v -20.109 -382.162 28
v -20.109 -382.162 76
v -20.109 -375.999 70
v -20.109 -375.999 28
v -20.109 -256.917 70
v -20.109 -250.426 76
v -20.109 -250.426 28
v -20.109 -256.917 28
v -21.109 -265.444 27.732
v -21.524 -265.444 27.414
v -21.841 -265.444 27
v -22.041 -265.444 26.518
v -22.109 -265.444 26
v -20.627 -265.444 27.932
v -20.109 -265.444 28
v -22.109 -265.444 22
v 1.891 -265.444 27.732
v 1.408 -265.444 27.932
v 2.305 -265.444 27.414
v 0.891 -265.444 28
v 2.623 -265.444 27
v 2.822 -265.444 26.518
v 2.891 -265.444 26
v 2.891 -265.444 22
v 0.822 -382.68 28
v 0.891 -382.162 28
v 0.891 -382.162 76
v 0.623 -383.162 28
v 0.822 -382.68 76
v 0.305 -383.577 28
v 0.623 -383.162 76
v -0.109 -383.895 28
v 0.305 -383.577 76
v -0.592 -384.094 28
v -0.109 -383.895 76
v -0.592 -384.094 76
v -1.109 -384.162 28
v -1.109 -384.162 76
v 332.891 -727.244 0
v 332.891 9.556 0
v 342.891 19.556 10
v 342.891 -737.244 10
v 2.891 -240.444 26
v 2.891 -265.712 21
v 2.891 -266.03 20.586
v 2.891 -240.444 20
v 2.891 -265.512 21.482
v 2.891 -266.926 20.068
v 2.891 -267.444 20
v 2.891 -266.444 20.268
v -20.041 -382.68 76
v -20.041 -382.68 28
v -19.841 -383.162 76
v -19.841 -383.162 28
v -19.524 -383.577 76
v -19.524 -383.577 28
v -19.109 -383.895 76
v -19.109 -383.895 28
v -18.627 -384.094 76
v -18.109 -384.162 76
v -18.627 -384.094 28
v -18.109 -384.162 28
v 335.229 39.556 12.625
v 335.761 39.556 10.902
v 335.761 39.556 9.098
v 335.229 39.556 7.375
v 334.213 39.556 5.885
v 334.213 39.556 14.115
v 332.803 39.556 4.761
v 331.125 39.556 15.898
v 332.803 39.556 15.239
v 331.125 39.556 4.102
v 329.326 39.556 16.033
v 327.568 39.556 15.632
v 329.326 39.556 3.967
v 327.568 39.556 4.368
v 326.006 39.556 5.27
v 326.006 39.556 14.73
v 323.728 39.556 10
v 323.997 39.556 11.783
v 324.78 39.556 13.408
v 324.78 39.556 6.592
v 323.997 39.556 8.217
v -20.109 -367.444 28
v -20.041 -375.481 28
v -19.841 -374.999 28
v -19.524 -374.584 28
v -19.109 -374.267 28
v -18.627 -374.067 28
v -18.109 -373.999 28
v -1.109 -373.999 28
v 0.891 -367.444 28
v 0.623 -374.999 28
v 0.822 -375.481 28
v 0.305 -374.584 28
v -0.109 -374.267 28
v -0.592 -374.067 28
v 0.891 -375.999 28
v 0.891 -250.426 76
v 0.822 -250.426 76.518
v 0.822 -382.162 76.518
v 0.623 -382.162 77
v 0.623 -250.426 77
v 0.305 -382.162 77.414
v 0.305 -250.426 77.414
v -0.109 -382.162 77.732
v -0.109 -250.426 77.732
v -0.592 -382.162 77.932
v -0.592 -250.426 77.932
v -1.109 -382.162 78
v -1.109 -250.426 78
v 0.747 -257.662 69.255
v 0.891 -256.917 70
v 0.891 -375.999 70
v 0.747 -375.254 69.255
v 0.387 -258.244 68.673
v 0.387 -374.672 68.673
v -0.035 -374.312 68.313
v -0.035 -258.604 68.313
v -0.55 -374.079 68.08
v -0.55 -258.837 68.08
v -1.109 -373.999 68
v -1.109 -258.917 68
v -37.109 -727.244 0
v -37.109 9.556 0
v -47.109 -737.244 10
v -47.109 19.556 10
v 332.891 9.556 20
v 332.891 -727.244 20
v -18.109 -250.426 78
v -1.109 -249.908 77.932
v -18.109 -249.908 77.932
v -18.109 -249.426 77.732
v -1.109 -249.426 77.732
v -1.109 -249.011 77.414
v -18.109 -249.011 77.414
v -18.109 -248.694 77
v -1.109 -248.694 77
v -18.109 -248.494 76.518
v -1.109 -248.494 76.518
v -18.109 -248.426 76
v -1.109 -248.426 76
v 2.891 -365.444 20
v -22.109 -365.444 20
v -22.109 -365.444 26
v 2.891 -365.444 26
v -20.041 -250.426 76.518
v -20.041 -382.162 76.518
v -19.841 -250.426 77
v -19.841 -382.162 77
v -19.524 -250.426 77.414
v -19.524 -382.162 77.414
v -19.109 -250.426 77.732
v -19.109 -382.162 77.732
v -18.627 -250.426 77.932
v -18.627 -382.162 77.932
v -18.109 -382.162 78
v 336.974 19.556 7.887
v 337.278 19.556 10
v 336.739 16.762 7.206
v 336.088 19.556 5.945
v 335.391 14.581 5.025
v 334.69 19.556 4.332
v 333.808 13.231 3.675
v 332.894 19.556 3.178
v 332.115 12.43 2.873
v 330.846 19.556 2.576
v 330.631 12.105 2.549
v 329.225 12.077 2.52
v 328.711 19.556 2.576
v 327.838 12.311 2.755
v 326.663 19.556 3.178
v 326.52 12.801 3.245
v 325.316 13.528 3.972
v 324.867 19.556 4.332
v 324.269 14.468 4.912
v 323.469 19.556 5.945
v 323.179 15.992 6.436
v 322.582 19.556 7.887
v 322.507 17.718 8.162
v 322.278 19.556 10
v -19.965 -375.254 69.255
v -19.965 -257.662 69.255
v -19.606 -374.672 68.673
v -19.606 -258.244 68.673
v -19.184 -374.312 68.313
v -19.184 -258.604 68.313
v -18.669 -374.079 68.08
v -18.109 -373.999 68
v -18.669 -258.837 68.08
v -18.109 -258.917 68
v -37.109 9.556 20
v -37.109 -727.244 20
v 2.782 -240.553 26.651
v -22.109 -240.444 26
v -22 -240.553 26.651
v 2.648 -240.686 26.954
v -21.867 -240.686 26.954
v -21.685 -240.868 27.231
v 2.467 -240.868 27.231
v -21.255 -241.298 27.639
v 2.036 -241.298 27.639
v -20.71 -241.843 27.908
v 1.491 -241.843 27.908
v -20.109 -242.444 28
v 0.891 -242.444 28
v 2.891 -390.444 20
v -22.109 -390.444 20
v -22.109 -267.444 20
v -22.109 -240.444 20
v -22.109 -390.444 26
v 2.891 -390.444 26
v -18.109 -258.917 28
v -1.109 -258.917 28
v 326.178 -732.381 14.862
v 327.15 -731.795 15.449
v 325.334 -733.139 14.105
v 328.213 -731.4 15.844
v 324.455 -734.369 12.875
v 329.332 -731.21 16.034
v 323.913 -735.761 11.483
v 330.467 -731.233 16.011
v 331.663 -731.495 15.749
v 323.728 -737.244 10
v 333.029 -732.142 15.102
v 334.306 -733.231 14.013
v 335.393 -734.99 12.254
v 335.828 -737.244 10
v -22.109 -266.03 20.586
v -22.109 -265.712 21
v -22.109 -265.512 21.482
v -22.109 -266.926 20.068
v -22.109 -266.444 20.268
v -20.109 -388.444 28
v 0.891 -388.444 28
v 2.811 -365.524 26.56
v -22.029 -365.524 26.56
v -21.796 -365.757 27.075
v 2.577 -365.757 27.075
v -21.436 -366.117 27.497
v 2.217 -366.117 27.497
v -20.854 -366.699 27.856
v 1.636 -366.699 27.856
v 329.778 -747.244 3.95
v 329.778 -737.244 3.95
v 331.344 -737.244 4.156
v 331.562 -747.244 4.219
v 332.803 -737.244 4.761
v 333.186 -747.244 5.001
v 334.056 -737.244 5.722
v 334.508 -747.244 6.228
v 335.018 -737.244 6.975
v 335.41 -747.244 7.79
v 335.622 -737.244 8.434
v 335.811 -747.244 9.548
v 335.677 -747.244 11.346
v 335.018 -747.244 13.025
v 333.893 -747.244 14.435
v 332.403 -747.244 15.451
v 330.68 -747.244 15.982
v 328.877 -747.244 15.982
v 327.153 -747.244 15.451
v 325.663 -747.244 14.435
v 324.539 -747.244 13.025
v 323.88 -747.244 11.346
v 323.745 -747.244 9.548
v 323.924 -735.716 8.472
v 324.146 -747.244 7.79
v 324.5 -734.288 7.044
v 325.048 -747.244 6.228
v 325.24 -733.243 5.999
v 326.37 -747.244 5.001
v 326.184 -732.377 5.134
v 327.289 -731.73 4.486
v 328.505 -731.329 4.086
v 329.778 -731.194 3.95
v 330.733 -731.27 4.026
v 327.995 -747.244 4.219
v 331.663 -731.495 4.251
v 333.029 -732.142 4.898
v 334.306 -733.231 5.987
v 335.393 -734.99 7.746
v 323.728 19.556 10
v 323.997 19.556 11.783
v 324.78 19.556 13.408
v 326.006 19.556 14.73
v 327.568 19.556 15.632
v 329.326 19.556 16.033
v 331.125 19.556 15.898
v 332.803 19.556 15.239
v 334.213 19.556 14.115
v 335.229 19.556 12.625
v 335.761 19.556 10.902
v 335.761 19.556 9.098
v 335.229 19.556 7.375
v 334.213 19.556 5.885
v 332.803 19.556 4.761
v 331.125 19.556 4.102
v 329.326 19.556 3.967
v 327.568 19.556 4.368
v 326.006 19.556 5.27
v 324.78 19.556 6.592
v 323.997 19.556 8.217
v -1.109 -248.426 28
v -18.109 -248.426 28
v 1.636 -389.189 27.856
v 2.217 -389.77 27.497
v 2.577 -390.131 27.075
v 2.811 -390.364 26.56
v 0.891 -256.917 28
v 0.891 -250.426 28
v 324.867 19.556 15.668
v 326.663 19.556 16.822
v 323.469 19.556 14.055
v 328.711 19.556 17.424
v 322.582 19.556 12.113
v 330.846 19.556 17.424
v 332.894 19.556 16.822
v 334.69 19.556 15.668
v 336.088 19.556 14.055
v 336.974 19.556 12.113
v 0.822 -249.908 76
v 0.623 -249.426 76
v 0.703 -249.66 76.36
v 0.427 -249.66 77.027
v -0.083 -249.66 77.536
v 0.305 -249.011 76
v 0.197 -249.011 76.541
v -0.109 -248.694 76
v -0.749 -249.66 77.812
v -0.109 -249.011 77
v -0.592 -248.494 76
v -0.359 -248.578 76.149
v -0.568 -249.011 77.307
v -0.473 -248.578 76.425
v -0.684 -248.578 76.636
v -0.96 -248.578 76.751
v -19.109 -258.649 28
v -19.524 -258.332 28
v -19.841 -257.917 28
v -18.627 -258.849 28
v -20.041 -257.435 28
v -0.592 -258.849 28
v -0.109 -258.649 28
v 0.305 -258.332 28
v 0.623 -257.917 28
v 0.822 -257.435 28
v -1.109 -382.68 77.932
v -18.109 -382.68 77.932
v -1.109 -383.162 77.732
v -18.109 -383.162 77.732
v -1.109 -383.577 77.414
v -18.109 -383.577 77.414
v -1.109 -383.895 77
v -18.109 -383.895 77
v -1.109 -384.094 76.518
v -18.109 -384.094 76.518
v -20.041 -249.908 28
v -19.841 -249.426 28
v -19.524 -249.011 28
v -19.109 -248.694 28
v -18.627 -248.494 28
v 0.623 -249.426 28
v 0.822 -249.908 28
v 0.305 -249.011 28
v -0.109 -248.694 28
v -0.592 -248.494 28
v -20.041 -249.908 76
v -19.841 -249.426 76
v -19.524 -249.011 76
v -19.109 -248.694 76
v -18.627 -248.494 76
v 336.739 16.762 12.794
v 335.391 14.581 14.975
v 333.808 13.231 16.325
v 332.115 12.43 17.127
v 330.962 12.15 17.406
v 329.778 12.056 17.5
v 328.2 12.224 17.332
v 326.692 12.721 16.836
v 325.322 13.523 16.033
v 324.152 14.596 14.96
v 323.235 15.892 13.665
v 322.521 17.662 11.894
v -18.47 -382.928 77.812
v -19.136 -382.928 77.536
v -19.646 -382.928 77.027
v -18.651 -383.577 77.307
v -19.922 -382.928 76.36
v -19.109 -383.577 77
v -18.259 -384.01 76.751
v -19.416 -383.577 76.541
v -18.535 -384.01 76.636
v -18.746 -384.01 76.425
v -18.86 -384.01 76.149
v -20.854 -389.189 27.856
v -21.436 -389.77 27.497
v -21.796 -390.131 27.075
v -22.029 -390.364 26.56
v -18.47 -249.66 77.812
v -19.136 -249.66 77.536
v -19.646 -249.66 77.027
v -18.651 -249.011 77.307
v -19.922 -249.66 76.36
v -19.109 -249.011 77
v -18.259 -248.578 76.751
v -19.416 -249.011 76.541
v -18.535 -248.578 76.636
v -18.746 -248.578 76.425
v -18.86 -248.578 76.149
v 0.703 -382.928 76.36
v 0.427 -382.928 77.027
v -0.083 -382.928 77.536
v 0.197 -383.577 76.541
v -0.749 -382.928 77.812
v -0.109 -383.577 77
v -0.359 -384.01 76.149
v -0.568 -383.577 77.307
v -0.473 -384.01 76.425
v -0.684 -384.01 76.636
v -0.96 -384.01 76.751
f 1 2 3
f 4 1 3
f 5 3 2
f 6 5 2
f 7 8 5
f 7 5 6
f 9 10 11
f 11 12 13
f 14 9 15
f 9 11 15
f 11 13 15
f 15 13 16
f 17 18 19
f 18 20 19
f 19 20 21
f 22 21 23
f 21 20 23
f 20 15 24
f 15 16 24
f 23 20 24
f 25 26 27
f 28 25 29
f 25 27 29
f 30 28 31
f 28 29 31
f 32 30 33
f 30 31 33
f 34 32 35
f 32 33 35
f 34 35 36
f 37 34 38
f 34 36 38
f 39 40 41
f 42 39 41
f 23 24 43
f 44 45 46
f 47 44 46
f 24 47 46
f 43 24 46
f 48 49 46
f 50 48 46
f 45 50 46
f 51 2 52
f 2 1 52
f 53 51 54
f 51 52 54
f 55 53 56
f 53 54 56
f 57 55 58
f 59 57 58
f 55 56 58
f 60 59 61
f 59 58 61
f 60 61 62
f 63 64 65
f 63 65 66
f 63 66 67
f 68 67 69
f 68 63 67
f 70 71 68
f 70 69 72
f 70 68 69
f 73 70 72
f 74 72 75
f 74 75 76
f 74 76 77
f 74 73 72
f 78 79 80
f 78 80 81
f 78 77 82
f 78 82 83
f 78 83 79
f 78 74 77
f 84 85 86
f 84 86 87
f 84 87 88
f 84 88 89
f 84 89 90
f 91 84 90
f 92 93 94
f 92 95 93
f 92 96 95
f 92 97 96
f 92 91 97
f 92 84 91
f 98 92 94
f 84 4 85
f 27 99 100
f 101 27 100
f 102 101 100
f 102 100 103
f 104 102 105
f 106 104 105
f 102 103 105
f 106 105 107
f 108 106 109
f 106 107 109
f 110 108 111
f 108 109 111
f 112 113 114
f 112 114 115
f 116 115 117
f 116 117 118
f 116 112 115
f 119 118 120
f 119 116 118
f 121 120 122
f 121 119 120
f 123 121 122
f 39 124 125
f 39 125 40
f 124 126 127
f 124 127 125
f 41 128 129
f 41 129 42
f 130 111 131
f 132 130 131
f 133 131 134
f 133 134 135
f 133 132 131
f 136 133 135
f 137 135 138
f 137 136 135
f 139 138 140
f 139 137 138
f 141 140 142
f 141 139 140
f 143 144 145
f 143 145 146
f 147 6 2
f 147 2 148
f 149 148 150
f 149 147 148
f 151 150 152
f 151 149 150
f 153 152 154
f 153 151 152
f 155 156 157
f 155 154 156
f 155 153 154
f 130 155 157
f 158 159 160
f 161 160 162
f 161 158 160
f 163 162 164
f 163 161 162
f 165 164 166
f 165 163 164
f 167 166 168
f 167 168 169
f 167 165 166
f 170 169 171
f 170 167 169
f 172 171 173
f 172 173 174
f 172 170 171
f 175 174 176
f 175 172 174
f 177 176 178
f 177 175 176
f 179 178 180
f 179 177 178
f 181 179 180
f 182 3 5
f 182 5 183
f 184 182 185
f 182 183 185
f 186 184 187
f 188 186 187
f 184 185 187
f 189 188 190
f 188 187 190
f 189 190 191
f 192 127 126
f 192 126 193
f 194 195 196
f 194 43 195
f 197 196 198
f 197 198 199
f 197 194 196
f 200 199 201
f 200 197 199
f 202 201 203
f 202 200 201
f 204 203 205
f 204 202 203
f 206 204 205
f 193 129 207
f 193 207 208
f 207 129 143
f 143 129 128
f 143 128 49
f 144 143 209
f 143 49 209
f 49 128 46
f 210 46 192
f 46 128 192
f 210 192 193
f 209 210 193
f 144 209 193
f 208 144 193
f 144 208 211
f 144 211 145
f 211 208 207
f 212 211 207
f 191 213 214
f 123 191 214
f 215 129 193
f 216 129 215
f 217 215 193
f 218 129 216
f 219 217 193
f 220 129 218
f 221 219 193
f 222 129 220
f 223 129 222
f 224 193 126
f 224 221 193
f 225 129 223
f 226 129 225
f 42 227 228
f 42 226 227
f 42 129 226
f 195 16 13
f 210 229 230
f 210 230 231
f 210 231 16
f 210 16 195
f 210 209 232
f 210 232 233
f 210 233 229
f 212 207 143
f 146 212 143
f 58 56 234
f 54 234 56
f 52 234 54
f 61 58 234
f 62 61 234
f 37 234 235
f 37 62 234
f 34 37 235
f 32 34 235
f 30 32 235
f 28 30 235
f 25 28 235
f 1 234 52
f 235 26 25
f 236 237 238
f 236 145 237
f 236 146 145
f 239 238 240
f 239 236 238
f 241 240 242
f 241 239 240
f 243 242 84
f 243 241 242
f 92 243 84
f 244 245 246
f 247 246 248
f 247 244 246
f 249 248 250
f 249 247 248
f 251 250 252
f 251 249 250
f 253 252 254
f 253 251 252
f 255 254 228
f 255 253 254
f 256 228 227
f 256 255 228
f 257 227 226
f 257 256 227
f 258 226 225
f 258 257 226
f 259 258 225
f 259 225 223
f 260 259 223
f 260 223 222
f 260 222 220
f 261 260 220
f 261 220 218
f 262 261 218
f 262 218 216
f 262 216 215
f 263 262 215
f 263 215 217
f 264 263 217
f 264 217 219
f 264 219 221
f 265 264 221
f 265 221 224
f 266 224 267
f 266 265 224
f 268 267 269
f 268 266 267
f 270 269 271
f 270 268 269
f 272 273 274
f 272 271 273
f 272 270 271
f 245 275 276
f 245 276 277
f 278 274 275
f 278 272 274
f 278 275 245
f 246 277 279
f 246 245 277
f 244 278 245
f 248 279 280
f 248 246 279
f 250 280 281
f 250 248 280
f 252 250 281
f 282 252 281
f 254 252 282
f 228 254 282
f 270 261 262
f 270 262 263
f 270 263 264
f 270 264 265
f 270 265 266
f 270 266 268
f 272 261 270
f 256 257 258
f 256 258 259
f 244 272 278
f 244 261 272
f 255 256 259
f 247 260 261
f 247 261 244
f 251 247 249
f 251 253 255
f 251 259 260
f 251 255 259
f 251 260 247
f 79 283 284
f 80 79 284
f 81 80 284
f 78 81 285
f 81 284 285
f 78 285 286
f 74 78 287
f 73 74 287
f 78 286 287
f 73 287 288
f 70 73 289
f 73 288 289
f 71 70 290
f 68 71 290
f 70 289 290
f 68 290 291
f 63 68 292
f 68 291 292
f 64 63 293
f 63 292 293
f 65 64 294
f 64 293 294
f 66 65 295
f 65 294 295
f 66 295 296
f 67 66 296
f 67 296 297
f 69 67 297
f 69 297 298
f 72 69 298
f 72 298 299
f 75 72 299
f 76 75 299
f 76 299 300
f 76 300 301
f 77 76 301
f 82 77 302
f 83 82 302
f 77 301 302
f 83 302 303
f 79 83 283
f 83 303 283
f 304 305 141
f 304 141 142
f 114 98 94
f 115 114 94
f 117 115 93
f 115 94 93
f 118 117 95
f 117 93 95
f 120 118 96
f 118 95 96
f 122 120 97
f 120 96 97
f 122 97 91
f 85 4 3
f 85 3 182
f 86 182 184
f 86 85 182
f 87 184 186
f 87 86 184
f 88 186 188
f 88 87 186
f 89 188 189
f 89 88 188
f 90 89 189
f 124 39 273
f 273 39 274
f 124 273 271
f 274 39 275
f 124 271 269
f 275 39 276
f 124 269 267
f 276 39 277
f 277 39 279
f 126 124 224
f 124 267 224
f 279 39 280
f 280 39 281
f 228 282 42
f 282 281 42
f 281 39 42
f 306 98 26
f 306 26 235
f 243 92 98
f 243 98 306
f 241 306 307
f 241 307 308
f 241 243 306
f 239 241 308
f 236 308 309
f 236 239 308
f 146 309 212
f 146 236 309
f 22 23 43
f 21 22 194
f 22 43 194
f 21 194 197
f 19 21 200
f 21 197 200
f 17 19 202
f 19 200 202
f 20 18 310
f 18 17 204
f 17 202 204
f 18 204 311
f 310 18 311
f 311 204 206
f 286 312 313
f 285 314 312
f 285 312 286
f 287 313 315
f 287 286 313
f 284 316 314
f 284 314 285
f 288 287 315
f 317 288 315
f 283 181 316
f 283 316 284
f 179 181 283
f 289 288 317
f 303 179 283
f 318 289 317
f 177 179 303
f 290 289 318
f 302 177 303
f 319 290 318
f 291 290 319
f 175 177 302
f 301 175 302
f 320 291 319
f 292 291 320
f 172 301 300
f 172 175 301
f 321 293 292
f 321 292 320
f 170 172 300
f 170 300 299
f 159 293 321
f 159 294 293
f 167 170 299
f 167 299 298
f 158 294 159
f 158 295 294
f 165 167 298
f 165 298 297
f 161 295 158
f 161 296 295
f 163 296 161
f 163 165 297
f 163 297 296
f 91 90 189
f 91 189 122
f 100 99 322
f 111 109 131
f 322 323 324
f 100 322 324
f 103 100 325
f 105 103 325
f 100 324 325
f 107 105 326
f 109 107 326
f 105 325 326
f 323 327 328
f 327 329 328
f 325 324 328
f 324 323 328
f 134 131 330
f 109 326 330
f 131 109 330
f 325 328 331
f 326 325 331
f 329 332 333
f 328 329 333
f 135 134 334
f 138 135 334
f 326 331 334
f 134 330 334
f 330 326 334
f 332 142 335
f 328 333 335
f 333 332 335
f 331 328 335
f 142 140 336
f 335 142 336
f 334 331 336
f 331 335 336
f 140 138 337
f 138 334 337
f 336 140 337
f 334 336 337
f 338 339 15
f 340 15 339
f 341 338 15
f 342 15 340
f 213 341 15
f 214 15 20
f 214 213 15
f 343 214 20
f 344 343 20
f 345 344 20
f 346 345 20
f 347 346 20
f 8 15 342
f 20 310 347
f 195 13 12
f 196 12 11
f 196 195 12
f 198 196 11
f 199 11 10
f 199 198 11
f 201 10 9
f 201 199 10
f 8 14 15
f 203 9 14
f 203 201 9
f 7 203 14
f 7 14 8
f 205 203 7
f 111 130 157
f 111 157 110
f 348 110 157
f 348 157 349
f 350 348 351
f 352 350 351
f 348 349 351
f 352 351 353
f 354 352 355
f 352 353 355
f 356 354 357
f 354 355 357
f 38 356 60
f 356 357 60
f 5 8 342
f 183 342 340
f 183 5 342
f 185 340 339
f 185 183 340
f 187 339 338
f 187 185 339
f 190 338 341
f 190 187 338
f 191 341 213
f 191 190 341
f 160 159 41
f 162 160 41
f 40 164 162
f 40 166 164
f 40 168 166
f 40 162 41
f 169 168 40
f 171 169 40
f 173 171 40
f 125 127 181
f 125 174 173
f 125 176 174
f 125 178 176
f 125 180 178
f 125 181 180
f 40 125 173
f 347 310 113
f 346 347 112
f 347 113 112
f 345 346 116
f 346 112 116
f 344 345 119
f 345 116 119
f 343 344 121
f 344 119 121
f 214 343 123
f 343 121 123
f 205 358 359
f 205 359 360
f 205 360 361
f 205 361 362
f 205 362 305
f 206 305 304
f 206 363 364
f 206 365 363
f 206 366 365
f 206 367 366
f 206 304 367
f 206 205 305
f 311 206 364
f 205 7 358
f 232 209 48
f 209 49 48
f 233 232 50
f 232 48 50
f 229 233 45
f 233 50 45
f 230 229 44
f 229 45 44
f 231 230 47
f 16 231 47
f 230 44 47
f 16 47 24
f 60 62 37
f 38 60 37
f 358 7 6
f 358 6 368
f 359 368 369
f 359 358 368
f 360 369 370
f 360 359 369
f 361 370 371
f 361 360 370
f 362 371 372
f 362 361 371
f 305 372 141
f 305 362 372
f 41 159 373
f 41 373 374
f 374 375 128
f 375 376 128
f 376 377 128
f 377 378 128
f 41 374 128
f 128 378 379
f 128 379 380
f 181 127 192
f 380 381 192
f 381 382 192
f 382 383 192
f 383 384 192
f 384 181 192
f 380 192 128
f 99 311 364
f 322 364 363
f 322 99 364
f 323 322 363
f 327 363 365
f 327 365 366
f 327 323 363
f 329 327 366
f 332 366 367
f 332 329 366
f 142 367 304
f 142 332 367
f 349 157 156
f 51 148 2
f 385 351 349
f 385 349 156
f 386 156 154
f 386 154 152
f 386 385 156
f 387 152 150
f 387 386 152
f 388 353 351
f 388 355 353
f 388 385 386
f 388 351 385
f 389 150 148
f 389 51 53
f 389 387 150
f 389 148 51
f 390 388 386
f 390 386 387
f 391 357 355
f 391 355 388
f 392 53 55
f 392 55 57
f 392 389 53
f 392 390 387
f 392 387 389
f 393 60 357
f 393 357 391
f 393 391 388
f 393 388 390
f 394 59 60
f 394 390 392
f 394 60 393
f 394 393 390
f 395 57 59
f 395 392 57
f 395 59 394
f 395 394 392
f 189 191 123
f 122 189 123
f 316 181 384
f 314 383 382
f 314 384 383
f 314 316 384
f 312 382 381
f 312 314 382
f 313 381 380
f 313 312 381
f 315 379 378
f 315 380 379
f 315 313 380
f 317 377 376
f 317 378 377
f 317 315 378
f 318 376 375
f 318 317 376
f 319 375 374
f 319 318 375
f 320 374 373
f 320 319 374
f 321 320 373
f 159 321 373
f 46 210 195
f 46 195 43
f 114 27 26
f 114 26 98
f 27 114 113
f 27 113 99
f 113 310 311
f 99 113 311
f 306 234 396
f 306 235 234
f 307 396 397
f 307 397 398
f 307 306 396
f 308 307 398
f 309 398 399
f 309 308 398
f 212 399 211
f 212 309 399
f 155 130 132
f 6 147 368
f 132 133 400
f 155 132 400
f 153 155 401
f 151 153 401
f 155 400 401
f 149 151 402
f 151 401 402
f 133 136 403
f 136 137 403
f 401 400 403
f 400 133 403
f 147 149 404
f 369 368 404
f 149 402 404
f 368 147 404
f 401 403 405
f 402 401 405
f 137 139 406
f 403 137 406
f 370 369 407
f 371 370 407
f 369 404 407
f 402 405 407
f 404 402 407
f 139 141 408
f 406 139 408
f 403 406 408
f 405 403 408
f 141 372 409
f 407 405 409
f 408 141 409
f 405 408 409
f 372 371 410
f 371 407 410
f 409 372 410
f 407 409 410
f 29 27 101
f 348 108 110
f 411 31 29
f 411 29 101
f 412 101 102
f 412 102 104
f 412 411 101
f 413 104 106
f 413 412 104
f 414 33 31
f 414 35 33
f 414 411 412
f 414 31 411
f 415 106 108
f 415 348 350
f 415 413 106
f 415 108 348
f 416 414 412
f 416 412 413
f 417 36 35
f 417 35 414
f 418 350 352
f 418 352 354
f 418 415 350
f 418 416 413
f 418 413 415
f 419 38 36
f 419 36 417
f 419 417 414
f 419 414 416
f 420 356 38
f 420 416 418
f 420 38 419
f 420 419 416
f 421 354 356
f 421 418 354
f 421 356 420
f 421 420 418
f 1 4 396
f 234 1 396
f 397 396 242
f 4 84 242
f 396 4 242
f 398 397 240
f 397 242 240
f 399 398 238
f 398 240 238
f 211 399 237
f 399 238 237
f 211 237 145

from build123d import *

# Parameters (mm, degrees)
SKETCH1_W            = 390
SKETCH1_H            = 756.8
BOSS_EXTRUDE1_DEPTH  = 20
SKETCH2_R            = 6.05
BOSS_EXTRUDE2_DEPTH  = 10
BOSS_EXTRUDE3_START  = 10
SKETCH3_R            = 6.05
BOSS_EXTRUDE3_DEPTH  = 10
CHAMFER1_SIZE        = 10
BOSS_EXTRUDE4_DEPTH  = 50
SKETCH5_W            = 30
SKETCH5_H            = 160
CUT_EXTRUDE1_DEPTH   = 131
CHAMFER2_SIZE        = 10
CUT_EXTRUDE2_DEPTH   = 78
SKETCH7_W            = 25
SKETCH7_H            = 25
BOSS_EXTRUDE5_DEPTH  = 8
FILLET1_R            = 2
FILLET2_R            = 2
SKETCH8_W            = 21
SKETCH8_H            = 10.491742635
SKETCH8_H_2          = 10.163875677
BOSS_EXTRUDE6_DEPTH  = 40
SKETCH9_W            = 21
SKETCH9_H            = 135.736920339
BOSS_EXTRUDE7_DEPTH  = 10
FILLET3_R            = 2
FILLET4_R            = 2
SKETCH15_R           = 7.5
BOSS_EXTRUDE17_DEPTH = 20
SKETCH17_R           = 7.5
CUT_EXTRUDE7_DEPTH   = 10
SKETCH18_R           = 6.05
BOSS_EXTRUDE18_DEPTH = 20


with BuildPart() as part:
    # Sketch1 → Boss-Extrude1 (new body)
    with BuildSketch(Plane.XY):
        with Locations((147.890593688, -358.84384058)):
            Rectangle(SKETCH1_W, SKETCH1_H)
    extrude(amount=BOSS_EXTRUDE1_DEPTH)

    # Sketch2 → Boss-Extrude2 (add)
    with BuildSketch(Plane(origin=(0, 19.55615942, 0), x_dir=(1, 0, 0), z_dir=(0, 1, 0))):
        with Locations(Location((329.77827945, -10, 0), (0, 0, 90))):
            Circle(SKETCH2_R)
    extrude(amount=BOSS_EXTRUDE2_DEPTH)

    # Sketch3 → Boss-Extrude3 (add)
    with BuildSketch(Plane.XZ.offset(737.24384058).offset(BOSS_EXTRUDE3_START)):
        with Locations(Location((329.77827945, 10, 0), (0, 0, 270))):
            Circle(SKETCH3_R)
    extrude(amount=-BOSS_EXTRUDE3_DEPTH)

    # Chamfer1
    # the kernel refuses this chamfer: 10 mm, written as the material it takes off along each edge
    with BuildSketch(Plane(origin=(368.607423567, -737.24384058, 0), x_dir=(0, 0.9996219169112968, -0.027495876610586487), z_dir=(-1, 0, 0))) as chamfer1_piece_1_section:
        Polygon((CHAMFER1_SIZE * 0.999621916911, -CHAMFER1_SIZE * 0.0274958766106), (-CHAMFER1_SIZE * 0.0274958766106, -CHAMFER1_SIZE * 0.999621916911), (0, 0), align=None)
    chamfer1_piece_1 = extrude(amount=441.433659759, mode=Mode.PRIVATE)
    chamfer1_piece_1 = chamfer1_piece_1 - Plane(origin=(329.77827945, -733.933944157, 10), x_dir=(0, 0, -1), z_dir=(0, -1, 0)) * Cylinder(6.05, 923, mode=Mode.PRIVATE)
    add(chamfer1_piece_1, mode=Mode.SUBTRACT)
    with BuildSketch(Plane(origin=(-47.109406312, -762.960670459, 0), x_dir=(-0.027495876610586317, 0, 0.9996219169112968), z_dir=(0, 1, 0)), Plane(origin=(342.890593688, 45.2729893, 20), x_dir=(-0.9996219169112968, 0, 0.027495876610586282), z_dir=(0, -1, 0))) as chamfer1_piece_2:
        Polygon((CHAMFER1_SIZE * 0.999621916911, CHAMFER1_SIZE * 0.0274958766106), (-CHAMFER1_SIZE * 0.0274958766106, CHAMFER1_SIZE * 0.999621916911), (0, 0), align=None)
    extrude(amount=808.233659759, mode=Mode.SUBTRACT)
    with BuildSketch(Plane(origin=(-72.826236192, 19.55615942, 0), x_dir=(0, 0.027495876610586317, 0.9996219169112968), z_dir=(1, 0, 0))) as chamfer1_piece_3_section:
        Polygon((CHAMFER1_SIZE * 0.999621916911, CHAMFER1_SIZE * 0.0274958766106), (-CHAMFER1_SIZE * 0.0274958766106, CHAMFER1_SIZE * 0.999621916911), (0, 0), align=None)
    chamfer1_piece_3 = extrude(amount=441.433659759, mode=Mode.PRIVATE)
    chamfer1_piece_3 = chamfer1_piece_3 - Plane(origin=(329.77827945, 16.24626296, 10), x_dir=(0, 0, -1), z_dir=(0, -1, 0)) * Cylinder(6.05, 923, mode=Mode.PRIVATE)
    add(chamfer1_piece_3, mode=Mode.SUBTRACT)
    with BuildSketch(Plane(origin=(342.890593688, 45.2729893, 0), x_dir=(-0.9996219169112968, 0, -0.027495876610586334), z_dir=(0, -1, 0)), Plane(origin=(-47.109406312, -762.960670459, 20), x_dir=(-0.027495876610586317, 0, -0.9996219169112968), z_dir=(0, 1, 0))) as chamfer1_piece_4:
        Polygon((CHAMFER1_SIZE * 0.999621916911, -CHAMFER1_SIZE * 0.0274958766106), (-CHAMFER1_SIZE * 0.0274958766106, -CHAMFER1_SIZE * 0.999621916911), (0, 0), align=None)
    extrude(amount=808.233659759, mode=Mode.SUBTRACT)
    with BuildSketch(Plane(origin=(368.607423567, -737.24384058, 20), x_dir=(0, 0.9996219169112968, 0.02749587661058643), z_dir=(-1, 0, 0))) as chamfer1_piece_5_section:
        Polygon((CHAMFER1_SIZE * 0.999621916911, CHAMFER1_SIZE * 0.0274958766106), (-CHAMFER1_SIZE * 0.0274958766106, CHAMFER1_SIZE * 0.999621916911), (0, 0), align=None)
    chamfer1_piece_5 = extrude(amount=441.433659759, mode=Mode.PRIVATE)
    chamfer1_piece_5 = chamfer1_piece_5 - Plane(origin=(329.77827945, -733.933944133, 10), x_dir=(0, 0, -1), z_dir=(0, -1, 0)) * Cylinder(6.05, 923, mode=Mode.PRIVATE)
    add(chamfer1_piece_5, mode=Mode.SUBTRACT)
    with BuildSketch(Plane(origin=(-72.826236192, 19.55615942, 20), x_dir=(0, 0.027495876610586317, -0.9996219169112968), z_dir=(1, 0, 0))) as chamfer1_piece_6_section:
        Polygon((CHAMFER1_SIZE * 0.999621916911, -CHAMFER1_SIZE * 0.0274958766106), (-CHAMFER1_SIZE * 0.0274958766106, -CHAMFER1_SIZE * 0.999621916911), (0, 0), align=None)
    chamfer1_piece_6 = extrude(amount=441.433659759, mode=Mode.PRIVATE)
    chamfer1_piece_6 = chamfer1_piece_6 - Plane(origin=(329.77827945, 16.246262993, 10), x_dir=(0, 0, -1), z_dir=(0, -1, 0)) * Cylinder(6.05, 923, mode=Mode.PRIVATE)
    add(chamfer1_piece_6, mode=Mode.SUBTRACT)

    # Sketch4 → Boss-Extrude4 (add)
    with BuildSketch(Plane.XY.offset(20)):
        Polygon((12.890593688, -358.84384058), (12.890593688, -258.84384058), (-37.109406312, -258.84384058), (-37.109406312, -458.84384058), (12.890593688, -458.84384058), align=None)
    extrude(amount=BOSS_EXTRUDE4_DEPTH)

    # Sketch5 → Cut-Extrude1 (cut)
    with BuildSketch(Plane.ZY.offset(37.109406312)):
        with Locations((35, -358.84384058)):
            Rectangle(SKETCH5_W, SKETCH5_H)
    extrude(amount=-CUT_EXTRUDE1_DEPTH, mode=Mode.SUBTRACT)

    # Chamfer2
    chamfer2_edges = [part.edges().sort_by_distance(p)[0] for p in [
        (-37.109406312, -458.84384058, 45),
        (12.890593688, -458.84384058, 45),
        (12.890593688, -258.84384058, 45),
        (-37.109406312, -258.84384058, 45),
        (-12.109406312, -458.84384058, 70),
        (12.890593688, -358.84384058, 70),
        (-12.109406312, -258.84384058, 70),
        (-37.109406312, -358.84384058, 70),
    ]]
    chamfer(chamfer2_edges, length=CHAMFER2_SIZE)

    # Sketch6 → Cut-Extrude2 (cut)
    with BuildSketch(Plane.XY.offset(20)):
        Polygon((-37.109406312, -268.84384058), (-27.109406312, -258.84384058), (2.890593688, -258.84384058), (12.890593688, -268.84384058), (12.890593688, -448.84384058), (2.890593688, -458.84384058), (-27.109406312, -458.84384058), (-37.109406312, -448.84384058), align=None)
    extrude(amount=CUT_EXTRUDE2_DEPTH, mode=Mode.SUBTRACT)

    # Sketch7 → Boss-Extrude5 (add)
    with BuildSketch(Plane.XY.offset(20)):
        with Locations((-9.609406312, -252.94384058)):
            Rectangle(SKETCH7_W, SKETCH7_H)
        with Locations((-9.609406312, -377.94384058)):
            Rectangle(SKETCH7_W, SKETCH7_H)
    extrude(amount=BOSS_EXTRUDE5_DEPTH)

    # Fillet1
    fillet1_edges = [part.edges().sort_by_distance(p)[0] for p in [
        (-9.609406312, -265.44384058, 20),
        (-22.109406312, -252.94384058, 28),
        (2.890593688, -252.94384058, 28),
        (-9.609406312, -240.44384058, 28),
    ]]
    fillet(fillet1_edges, radius=FILLET1_R)

    # Fillet2
    fillet2_edges = [part.edges().sort_by_distance(p)[0] for p in [
        (-22.109406312, -377.94384058, 28),
        (-9.609406312, -390.44384058, 28),
        (2.890593688, -377.94384058, 28),
        (-9.609406312, -365.44384058, 28),
    ]]
    fillet(fillet2_edges, radius=FILLET2_R)

    # Sketch8 → Boss-Extrude6 (add)
    with BuildSketch(Plane.XY.offset(28)):
        with Locations((-9.609406312, -253.671430769)):
            Rectangle(SKETCH8_W, SKETCH8_H)
        with Locations((-9.609406312, -379.080541951)):
            Rectangle(SKETCH8_W, SKETCH8_H_2)
    extrude(amount=BOSS_EXTRUDE6_DEPTH)

    # Sketch9 → Boss-Extrude7 (add)
    with BuildSketch(Plane.XY.offset(68)):
        with Locations((-9.609406312, -316.294019621)):
            Rectangle(SKETCH9_W, SKETCH9_H)
    extrude(amount=BOSS_EXTRUDE7_DEPTH)

    # Fillet3
    fillet3_edges = [part.edges().sort_by_distance(p)[0] for p in [
        (-20.109406312, -316.457953099, 68),
        (0.890593688, -316.457953099, 68),
        (-20.109406312, -316.294019621, 78),
        (0.890593688, -316.294019621, 78),
    ]]
    fillet(fillet3_edges, radius=FILLET3_R)

    # Fillet4
    fillet4_edges = [part.edges().sort_by_distance(p)[0] for p in [
        (0.30480725, -248.425559451, 77.414213562),
        (-9.609406312, -248.425559451, 78),
        (-19.523619875, -248.425559451, 77.414213562),
        (0.30480725, -384.16247979, 77.414213562),
        (-19.523619875, -384.16247979, 77.414213562),
        (0.890593688, -258.917302086, 49),
        (0.890593688, -248.425559451, 52),
        (-20.109406312, -248.425559451, 52),
        (-20.109406312, -258.917302086, 49),
        (0.890593688, -373.998604113, 49),
        (-20.109406312, -373.998604113, 49),
        (-9.609406312, -384.16247979, 78),
        (0.890593688, -384.16247979, 52),
        (-20.109406312, -384.16247979, 52),
    ]]
    fillet(fillet4_edges, radius=FILLET4_R)

    # Sketch15 → Boss-Extrude17 (add)
    with BuildSketch(Plane(origin=(0, 29.55615942, 0), x_dir=(1, 0, 0), z_dir=(0, 1, 0))):
        with Locations(Location((329.77827945, -10, 0), (0, 0, 270))):
            Circle(SKETCH15_R)
    extrude(amount=-BOSS_EXTRUDE17_DEPTH)

    # Sketch17 → Cut-Extrude7 (cut)
    with BuildSketch(Plane(origin=(0, 29.55615942, 0), x_dir=(1, 0, 0), z_dir=(0, 1, 0))):
        with Locations((329.77827945, -10)):
            Circle(SKETCH17_R)
    extrude(amount=-CUT_EXTRUDE7_DEPTH, mode=Mode.SUBTRACT)

    # Sketch18 → Boss-Extrude18 (add)
    with BuildSketch(Plane(origin=(0, 19.55615942, 0), x_dir=(1, 0, 0), z_dir=(0, 1, 0))):
        with Locations(Location((329.77827945, -10, 0), (0, 0, 180))):
            Circle(SKETCH18_R)
    extrude(amount=BOSS_EXTRUDE18_DEPTH)


solid = part.part
